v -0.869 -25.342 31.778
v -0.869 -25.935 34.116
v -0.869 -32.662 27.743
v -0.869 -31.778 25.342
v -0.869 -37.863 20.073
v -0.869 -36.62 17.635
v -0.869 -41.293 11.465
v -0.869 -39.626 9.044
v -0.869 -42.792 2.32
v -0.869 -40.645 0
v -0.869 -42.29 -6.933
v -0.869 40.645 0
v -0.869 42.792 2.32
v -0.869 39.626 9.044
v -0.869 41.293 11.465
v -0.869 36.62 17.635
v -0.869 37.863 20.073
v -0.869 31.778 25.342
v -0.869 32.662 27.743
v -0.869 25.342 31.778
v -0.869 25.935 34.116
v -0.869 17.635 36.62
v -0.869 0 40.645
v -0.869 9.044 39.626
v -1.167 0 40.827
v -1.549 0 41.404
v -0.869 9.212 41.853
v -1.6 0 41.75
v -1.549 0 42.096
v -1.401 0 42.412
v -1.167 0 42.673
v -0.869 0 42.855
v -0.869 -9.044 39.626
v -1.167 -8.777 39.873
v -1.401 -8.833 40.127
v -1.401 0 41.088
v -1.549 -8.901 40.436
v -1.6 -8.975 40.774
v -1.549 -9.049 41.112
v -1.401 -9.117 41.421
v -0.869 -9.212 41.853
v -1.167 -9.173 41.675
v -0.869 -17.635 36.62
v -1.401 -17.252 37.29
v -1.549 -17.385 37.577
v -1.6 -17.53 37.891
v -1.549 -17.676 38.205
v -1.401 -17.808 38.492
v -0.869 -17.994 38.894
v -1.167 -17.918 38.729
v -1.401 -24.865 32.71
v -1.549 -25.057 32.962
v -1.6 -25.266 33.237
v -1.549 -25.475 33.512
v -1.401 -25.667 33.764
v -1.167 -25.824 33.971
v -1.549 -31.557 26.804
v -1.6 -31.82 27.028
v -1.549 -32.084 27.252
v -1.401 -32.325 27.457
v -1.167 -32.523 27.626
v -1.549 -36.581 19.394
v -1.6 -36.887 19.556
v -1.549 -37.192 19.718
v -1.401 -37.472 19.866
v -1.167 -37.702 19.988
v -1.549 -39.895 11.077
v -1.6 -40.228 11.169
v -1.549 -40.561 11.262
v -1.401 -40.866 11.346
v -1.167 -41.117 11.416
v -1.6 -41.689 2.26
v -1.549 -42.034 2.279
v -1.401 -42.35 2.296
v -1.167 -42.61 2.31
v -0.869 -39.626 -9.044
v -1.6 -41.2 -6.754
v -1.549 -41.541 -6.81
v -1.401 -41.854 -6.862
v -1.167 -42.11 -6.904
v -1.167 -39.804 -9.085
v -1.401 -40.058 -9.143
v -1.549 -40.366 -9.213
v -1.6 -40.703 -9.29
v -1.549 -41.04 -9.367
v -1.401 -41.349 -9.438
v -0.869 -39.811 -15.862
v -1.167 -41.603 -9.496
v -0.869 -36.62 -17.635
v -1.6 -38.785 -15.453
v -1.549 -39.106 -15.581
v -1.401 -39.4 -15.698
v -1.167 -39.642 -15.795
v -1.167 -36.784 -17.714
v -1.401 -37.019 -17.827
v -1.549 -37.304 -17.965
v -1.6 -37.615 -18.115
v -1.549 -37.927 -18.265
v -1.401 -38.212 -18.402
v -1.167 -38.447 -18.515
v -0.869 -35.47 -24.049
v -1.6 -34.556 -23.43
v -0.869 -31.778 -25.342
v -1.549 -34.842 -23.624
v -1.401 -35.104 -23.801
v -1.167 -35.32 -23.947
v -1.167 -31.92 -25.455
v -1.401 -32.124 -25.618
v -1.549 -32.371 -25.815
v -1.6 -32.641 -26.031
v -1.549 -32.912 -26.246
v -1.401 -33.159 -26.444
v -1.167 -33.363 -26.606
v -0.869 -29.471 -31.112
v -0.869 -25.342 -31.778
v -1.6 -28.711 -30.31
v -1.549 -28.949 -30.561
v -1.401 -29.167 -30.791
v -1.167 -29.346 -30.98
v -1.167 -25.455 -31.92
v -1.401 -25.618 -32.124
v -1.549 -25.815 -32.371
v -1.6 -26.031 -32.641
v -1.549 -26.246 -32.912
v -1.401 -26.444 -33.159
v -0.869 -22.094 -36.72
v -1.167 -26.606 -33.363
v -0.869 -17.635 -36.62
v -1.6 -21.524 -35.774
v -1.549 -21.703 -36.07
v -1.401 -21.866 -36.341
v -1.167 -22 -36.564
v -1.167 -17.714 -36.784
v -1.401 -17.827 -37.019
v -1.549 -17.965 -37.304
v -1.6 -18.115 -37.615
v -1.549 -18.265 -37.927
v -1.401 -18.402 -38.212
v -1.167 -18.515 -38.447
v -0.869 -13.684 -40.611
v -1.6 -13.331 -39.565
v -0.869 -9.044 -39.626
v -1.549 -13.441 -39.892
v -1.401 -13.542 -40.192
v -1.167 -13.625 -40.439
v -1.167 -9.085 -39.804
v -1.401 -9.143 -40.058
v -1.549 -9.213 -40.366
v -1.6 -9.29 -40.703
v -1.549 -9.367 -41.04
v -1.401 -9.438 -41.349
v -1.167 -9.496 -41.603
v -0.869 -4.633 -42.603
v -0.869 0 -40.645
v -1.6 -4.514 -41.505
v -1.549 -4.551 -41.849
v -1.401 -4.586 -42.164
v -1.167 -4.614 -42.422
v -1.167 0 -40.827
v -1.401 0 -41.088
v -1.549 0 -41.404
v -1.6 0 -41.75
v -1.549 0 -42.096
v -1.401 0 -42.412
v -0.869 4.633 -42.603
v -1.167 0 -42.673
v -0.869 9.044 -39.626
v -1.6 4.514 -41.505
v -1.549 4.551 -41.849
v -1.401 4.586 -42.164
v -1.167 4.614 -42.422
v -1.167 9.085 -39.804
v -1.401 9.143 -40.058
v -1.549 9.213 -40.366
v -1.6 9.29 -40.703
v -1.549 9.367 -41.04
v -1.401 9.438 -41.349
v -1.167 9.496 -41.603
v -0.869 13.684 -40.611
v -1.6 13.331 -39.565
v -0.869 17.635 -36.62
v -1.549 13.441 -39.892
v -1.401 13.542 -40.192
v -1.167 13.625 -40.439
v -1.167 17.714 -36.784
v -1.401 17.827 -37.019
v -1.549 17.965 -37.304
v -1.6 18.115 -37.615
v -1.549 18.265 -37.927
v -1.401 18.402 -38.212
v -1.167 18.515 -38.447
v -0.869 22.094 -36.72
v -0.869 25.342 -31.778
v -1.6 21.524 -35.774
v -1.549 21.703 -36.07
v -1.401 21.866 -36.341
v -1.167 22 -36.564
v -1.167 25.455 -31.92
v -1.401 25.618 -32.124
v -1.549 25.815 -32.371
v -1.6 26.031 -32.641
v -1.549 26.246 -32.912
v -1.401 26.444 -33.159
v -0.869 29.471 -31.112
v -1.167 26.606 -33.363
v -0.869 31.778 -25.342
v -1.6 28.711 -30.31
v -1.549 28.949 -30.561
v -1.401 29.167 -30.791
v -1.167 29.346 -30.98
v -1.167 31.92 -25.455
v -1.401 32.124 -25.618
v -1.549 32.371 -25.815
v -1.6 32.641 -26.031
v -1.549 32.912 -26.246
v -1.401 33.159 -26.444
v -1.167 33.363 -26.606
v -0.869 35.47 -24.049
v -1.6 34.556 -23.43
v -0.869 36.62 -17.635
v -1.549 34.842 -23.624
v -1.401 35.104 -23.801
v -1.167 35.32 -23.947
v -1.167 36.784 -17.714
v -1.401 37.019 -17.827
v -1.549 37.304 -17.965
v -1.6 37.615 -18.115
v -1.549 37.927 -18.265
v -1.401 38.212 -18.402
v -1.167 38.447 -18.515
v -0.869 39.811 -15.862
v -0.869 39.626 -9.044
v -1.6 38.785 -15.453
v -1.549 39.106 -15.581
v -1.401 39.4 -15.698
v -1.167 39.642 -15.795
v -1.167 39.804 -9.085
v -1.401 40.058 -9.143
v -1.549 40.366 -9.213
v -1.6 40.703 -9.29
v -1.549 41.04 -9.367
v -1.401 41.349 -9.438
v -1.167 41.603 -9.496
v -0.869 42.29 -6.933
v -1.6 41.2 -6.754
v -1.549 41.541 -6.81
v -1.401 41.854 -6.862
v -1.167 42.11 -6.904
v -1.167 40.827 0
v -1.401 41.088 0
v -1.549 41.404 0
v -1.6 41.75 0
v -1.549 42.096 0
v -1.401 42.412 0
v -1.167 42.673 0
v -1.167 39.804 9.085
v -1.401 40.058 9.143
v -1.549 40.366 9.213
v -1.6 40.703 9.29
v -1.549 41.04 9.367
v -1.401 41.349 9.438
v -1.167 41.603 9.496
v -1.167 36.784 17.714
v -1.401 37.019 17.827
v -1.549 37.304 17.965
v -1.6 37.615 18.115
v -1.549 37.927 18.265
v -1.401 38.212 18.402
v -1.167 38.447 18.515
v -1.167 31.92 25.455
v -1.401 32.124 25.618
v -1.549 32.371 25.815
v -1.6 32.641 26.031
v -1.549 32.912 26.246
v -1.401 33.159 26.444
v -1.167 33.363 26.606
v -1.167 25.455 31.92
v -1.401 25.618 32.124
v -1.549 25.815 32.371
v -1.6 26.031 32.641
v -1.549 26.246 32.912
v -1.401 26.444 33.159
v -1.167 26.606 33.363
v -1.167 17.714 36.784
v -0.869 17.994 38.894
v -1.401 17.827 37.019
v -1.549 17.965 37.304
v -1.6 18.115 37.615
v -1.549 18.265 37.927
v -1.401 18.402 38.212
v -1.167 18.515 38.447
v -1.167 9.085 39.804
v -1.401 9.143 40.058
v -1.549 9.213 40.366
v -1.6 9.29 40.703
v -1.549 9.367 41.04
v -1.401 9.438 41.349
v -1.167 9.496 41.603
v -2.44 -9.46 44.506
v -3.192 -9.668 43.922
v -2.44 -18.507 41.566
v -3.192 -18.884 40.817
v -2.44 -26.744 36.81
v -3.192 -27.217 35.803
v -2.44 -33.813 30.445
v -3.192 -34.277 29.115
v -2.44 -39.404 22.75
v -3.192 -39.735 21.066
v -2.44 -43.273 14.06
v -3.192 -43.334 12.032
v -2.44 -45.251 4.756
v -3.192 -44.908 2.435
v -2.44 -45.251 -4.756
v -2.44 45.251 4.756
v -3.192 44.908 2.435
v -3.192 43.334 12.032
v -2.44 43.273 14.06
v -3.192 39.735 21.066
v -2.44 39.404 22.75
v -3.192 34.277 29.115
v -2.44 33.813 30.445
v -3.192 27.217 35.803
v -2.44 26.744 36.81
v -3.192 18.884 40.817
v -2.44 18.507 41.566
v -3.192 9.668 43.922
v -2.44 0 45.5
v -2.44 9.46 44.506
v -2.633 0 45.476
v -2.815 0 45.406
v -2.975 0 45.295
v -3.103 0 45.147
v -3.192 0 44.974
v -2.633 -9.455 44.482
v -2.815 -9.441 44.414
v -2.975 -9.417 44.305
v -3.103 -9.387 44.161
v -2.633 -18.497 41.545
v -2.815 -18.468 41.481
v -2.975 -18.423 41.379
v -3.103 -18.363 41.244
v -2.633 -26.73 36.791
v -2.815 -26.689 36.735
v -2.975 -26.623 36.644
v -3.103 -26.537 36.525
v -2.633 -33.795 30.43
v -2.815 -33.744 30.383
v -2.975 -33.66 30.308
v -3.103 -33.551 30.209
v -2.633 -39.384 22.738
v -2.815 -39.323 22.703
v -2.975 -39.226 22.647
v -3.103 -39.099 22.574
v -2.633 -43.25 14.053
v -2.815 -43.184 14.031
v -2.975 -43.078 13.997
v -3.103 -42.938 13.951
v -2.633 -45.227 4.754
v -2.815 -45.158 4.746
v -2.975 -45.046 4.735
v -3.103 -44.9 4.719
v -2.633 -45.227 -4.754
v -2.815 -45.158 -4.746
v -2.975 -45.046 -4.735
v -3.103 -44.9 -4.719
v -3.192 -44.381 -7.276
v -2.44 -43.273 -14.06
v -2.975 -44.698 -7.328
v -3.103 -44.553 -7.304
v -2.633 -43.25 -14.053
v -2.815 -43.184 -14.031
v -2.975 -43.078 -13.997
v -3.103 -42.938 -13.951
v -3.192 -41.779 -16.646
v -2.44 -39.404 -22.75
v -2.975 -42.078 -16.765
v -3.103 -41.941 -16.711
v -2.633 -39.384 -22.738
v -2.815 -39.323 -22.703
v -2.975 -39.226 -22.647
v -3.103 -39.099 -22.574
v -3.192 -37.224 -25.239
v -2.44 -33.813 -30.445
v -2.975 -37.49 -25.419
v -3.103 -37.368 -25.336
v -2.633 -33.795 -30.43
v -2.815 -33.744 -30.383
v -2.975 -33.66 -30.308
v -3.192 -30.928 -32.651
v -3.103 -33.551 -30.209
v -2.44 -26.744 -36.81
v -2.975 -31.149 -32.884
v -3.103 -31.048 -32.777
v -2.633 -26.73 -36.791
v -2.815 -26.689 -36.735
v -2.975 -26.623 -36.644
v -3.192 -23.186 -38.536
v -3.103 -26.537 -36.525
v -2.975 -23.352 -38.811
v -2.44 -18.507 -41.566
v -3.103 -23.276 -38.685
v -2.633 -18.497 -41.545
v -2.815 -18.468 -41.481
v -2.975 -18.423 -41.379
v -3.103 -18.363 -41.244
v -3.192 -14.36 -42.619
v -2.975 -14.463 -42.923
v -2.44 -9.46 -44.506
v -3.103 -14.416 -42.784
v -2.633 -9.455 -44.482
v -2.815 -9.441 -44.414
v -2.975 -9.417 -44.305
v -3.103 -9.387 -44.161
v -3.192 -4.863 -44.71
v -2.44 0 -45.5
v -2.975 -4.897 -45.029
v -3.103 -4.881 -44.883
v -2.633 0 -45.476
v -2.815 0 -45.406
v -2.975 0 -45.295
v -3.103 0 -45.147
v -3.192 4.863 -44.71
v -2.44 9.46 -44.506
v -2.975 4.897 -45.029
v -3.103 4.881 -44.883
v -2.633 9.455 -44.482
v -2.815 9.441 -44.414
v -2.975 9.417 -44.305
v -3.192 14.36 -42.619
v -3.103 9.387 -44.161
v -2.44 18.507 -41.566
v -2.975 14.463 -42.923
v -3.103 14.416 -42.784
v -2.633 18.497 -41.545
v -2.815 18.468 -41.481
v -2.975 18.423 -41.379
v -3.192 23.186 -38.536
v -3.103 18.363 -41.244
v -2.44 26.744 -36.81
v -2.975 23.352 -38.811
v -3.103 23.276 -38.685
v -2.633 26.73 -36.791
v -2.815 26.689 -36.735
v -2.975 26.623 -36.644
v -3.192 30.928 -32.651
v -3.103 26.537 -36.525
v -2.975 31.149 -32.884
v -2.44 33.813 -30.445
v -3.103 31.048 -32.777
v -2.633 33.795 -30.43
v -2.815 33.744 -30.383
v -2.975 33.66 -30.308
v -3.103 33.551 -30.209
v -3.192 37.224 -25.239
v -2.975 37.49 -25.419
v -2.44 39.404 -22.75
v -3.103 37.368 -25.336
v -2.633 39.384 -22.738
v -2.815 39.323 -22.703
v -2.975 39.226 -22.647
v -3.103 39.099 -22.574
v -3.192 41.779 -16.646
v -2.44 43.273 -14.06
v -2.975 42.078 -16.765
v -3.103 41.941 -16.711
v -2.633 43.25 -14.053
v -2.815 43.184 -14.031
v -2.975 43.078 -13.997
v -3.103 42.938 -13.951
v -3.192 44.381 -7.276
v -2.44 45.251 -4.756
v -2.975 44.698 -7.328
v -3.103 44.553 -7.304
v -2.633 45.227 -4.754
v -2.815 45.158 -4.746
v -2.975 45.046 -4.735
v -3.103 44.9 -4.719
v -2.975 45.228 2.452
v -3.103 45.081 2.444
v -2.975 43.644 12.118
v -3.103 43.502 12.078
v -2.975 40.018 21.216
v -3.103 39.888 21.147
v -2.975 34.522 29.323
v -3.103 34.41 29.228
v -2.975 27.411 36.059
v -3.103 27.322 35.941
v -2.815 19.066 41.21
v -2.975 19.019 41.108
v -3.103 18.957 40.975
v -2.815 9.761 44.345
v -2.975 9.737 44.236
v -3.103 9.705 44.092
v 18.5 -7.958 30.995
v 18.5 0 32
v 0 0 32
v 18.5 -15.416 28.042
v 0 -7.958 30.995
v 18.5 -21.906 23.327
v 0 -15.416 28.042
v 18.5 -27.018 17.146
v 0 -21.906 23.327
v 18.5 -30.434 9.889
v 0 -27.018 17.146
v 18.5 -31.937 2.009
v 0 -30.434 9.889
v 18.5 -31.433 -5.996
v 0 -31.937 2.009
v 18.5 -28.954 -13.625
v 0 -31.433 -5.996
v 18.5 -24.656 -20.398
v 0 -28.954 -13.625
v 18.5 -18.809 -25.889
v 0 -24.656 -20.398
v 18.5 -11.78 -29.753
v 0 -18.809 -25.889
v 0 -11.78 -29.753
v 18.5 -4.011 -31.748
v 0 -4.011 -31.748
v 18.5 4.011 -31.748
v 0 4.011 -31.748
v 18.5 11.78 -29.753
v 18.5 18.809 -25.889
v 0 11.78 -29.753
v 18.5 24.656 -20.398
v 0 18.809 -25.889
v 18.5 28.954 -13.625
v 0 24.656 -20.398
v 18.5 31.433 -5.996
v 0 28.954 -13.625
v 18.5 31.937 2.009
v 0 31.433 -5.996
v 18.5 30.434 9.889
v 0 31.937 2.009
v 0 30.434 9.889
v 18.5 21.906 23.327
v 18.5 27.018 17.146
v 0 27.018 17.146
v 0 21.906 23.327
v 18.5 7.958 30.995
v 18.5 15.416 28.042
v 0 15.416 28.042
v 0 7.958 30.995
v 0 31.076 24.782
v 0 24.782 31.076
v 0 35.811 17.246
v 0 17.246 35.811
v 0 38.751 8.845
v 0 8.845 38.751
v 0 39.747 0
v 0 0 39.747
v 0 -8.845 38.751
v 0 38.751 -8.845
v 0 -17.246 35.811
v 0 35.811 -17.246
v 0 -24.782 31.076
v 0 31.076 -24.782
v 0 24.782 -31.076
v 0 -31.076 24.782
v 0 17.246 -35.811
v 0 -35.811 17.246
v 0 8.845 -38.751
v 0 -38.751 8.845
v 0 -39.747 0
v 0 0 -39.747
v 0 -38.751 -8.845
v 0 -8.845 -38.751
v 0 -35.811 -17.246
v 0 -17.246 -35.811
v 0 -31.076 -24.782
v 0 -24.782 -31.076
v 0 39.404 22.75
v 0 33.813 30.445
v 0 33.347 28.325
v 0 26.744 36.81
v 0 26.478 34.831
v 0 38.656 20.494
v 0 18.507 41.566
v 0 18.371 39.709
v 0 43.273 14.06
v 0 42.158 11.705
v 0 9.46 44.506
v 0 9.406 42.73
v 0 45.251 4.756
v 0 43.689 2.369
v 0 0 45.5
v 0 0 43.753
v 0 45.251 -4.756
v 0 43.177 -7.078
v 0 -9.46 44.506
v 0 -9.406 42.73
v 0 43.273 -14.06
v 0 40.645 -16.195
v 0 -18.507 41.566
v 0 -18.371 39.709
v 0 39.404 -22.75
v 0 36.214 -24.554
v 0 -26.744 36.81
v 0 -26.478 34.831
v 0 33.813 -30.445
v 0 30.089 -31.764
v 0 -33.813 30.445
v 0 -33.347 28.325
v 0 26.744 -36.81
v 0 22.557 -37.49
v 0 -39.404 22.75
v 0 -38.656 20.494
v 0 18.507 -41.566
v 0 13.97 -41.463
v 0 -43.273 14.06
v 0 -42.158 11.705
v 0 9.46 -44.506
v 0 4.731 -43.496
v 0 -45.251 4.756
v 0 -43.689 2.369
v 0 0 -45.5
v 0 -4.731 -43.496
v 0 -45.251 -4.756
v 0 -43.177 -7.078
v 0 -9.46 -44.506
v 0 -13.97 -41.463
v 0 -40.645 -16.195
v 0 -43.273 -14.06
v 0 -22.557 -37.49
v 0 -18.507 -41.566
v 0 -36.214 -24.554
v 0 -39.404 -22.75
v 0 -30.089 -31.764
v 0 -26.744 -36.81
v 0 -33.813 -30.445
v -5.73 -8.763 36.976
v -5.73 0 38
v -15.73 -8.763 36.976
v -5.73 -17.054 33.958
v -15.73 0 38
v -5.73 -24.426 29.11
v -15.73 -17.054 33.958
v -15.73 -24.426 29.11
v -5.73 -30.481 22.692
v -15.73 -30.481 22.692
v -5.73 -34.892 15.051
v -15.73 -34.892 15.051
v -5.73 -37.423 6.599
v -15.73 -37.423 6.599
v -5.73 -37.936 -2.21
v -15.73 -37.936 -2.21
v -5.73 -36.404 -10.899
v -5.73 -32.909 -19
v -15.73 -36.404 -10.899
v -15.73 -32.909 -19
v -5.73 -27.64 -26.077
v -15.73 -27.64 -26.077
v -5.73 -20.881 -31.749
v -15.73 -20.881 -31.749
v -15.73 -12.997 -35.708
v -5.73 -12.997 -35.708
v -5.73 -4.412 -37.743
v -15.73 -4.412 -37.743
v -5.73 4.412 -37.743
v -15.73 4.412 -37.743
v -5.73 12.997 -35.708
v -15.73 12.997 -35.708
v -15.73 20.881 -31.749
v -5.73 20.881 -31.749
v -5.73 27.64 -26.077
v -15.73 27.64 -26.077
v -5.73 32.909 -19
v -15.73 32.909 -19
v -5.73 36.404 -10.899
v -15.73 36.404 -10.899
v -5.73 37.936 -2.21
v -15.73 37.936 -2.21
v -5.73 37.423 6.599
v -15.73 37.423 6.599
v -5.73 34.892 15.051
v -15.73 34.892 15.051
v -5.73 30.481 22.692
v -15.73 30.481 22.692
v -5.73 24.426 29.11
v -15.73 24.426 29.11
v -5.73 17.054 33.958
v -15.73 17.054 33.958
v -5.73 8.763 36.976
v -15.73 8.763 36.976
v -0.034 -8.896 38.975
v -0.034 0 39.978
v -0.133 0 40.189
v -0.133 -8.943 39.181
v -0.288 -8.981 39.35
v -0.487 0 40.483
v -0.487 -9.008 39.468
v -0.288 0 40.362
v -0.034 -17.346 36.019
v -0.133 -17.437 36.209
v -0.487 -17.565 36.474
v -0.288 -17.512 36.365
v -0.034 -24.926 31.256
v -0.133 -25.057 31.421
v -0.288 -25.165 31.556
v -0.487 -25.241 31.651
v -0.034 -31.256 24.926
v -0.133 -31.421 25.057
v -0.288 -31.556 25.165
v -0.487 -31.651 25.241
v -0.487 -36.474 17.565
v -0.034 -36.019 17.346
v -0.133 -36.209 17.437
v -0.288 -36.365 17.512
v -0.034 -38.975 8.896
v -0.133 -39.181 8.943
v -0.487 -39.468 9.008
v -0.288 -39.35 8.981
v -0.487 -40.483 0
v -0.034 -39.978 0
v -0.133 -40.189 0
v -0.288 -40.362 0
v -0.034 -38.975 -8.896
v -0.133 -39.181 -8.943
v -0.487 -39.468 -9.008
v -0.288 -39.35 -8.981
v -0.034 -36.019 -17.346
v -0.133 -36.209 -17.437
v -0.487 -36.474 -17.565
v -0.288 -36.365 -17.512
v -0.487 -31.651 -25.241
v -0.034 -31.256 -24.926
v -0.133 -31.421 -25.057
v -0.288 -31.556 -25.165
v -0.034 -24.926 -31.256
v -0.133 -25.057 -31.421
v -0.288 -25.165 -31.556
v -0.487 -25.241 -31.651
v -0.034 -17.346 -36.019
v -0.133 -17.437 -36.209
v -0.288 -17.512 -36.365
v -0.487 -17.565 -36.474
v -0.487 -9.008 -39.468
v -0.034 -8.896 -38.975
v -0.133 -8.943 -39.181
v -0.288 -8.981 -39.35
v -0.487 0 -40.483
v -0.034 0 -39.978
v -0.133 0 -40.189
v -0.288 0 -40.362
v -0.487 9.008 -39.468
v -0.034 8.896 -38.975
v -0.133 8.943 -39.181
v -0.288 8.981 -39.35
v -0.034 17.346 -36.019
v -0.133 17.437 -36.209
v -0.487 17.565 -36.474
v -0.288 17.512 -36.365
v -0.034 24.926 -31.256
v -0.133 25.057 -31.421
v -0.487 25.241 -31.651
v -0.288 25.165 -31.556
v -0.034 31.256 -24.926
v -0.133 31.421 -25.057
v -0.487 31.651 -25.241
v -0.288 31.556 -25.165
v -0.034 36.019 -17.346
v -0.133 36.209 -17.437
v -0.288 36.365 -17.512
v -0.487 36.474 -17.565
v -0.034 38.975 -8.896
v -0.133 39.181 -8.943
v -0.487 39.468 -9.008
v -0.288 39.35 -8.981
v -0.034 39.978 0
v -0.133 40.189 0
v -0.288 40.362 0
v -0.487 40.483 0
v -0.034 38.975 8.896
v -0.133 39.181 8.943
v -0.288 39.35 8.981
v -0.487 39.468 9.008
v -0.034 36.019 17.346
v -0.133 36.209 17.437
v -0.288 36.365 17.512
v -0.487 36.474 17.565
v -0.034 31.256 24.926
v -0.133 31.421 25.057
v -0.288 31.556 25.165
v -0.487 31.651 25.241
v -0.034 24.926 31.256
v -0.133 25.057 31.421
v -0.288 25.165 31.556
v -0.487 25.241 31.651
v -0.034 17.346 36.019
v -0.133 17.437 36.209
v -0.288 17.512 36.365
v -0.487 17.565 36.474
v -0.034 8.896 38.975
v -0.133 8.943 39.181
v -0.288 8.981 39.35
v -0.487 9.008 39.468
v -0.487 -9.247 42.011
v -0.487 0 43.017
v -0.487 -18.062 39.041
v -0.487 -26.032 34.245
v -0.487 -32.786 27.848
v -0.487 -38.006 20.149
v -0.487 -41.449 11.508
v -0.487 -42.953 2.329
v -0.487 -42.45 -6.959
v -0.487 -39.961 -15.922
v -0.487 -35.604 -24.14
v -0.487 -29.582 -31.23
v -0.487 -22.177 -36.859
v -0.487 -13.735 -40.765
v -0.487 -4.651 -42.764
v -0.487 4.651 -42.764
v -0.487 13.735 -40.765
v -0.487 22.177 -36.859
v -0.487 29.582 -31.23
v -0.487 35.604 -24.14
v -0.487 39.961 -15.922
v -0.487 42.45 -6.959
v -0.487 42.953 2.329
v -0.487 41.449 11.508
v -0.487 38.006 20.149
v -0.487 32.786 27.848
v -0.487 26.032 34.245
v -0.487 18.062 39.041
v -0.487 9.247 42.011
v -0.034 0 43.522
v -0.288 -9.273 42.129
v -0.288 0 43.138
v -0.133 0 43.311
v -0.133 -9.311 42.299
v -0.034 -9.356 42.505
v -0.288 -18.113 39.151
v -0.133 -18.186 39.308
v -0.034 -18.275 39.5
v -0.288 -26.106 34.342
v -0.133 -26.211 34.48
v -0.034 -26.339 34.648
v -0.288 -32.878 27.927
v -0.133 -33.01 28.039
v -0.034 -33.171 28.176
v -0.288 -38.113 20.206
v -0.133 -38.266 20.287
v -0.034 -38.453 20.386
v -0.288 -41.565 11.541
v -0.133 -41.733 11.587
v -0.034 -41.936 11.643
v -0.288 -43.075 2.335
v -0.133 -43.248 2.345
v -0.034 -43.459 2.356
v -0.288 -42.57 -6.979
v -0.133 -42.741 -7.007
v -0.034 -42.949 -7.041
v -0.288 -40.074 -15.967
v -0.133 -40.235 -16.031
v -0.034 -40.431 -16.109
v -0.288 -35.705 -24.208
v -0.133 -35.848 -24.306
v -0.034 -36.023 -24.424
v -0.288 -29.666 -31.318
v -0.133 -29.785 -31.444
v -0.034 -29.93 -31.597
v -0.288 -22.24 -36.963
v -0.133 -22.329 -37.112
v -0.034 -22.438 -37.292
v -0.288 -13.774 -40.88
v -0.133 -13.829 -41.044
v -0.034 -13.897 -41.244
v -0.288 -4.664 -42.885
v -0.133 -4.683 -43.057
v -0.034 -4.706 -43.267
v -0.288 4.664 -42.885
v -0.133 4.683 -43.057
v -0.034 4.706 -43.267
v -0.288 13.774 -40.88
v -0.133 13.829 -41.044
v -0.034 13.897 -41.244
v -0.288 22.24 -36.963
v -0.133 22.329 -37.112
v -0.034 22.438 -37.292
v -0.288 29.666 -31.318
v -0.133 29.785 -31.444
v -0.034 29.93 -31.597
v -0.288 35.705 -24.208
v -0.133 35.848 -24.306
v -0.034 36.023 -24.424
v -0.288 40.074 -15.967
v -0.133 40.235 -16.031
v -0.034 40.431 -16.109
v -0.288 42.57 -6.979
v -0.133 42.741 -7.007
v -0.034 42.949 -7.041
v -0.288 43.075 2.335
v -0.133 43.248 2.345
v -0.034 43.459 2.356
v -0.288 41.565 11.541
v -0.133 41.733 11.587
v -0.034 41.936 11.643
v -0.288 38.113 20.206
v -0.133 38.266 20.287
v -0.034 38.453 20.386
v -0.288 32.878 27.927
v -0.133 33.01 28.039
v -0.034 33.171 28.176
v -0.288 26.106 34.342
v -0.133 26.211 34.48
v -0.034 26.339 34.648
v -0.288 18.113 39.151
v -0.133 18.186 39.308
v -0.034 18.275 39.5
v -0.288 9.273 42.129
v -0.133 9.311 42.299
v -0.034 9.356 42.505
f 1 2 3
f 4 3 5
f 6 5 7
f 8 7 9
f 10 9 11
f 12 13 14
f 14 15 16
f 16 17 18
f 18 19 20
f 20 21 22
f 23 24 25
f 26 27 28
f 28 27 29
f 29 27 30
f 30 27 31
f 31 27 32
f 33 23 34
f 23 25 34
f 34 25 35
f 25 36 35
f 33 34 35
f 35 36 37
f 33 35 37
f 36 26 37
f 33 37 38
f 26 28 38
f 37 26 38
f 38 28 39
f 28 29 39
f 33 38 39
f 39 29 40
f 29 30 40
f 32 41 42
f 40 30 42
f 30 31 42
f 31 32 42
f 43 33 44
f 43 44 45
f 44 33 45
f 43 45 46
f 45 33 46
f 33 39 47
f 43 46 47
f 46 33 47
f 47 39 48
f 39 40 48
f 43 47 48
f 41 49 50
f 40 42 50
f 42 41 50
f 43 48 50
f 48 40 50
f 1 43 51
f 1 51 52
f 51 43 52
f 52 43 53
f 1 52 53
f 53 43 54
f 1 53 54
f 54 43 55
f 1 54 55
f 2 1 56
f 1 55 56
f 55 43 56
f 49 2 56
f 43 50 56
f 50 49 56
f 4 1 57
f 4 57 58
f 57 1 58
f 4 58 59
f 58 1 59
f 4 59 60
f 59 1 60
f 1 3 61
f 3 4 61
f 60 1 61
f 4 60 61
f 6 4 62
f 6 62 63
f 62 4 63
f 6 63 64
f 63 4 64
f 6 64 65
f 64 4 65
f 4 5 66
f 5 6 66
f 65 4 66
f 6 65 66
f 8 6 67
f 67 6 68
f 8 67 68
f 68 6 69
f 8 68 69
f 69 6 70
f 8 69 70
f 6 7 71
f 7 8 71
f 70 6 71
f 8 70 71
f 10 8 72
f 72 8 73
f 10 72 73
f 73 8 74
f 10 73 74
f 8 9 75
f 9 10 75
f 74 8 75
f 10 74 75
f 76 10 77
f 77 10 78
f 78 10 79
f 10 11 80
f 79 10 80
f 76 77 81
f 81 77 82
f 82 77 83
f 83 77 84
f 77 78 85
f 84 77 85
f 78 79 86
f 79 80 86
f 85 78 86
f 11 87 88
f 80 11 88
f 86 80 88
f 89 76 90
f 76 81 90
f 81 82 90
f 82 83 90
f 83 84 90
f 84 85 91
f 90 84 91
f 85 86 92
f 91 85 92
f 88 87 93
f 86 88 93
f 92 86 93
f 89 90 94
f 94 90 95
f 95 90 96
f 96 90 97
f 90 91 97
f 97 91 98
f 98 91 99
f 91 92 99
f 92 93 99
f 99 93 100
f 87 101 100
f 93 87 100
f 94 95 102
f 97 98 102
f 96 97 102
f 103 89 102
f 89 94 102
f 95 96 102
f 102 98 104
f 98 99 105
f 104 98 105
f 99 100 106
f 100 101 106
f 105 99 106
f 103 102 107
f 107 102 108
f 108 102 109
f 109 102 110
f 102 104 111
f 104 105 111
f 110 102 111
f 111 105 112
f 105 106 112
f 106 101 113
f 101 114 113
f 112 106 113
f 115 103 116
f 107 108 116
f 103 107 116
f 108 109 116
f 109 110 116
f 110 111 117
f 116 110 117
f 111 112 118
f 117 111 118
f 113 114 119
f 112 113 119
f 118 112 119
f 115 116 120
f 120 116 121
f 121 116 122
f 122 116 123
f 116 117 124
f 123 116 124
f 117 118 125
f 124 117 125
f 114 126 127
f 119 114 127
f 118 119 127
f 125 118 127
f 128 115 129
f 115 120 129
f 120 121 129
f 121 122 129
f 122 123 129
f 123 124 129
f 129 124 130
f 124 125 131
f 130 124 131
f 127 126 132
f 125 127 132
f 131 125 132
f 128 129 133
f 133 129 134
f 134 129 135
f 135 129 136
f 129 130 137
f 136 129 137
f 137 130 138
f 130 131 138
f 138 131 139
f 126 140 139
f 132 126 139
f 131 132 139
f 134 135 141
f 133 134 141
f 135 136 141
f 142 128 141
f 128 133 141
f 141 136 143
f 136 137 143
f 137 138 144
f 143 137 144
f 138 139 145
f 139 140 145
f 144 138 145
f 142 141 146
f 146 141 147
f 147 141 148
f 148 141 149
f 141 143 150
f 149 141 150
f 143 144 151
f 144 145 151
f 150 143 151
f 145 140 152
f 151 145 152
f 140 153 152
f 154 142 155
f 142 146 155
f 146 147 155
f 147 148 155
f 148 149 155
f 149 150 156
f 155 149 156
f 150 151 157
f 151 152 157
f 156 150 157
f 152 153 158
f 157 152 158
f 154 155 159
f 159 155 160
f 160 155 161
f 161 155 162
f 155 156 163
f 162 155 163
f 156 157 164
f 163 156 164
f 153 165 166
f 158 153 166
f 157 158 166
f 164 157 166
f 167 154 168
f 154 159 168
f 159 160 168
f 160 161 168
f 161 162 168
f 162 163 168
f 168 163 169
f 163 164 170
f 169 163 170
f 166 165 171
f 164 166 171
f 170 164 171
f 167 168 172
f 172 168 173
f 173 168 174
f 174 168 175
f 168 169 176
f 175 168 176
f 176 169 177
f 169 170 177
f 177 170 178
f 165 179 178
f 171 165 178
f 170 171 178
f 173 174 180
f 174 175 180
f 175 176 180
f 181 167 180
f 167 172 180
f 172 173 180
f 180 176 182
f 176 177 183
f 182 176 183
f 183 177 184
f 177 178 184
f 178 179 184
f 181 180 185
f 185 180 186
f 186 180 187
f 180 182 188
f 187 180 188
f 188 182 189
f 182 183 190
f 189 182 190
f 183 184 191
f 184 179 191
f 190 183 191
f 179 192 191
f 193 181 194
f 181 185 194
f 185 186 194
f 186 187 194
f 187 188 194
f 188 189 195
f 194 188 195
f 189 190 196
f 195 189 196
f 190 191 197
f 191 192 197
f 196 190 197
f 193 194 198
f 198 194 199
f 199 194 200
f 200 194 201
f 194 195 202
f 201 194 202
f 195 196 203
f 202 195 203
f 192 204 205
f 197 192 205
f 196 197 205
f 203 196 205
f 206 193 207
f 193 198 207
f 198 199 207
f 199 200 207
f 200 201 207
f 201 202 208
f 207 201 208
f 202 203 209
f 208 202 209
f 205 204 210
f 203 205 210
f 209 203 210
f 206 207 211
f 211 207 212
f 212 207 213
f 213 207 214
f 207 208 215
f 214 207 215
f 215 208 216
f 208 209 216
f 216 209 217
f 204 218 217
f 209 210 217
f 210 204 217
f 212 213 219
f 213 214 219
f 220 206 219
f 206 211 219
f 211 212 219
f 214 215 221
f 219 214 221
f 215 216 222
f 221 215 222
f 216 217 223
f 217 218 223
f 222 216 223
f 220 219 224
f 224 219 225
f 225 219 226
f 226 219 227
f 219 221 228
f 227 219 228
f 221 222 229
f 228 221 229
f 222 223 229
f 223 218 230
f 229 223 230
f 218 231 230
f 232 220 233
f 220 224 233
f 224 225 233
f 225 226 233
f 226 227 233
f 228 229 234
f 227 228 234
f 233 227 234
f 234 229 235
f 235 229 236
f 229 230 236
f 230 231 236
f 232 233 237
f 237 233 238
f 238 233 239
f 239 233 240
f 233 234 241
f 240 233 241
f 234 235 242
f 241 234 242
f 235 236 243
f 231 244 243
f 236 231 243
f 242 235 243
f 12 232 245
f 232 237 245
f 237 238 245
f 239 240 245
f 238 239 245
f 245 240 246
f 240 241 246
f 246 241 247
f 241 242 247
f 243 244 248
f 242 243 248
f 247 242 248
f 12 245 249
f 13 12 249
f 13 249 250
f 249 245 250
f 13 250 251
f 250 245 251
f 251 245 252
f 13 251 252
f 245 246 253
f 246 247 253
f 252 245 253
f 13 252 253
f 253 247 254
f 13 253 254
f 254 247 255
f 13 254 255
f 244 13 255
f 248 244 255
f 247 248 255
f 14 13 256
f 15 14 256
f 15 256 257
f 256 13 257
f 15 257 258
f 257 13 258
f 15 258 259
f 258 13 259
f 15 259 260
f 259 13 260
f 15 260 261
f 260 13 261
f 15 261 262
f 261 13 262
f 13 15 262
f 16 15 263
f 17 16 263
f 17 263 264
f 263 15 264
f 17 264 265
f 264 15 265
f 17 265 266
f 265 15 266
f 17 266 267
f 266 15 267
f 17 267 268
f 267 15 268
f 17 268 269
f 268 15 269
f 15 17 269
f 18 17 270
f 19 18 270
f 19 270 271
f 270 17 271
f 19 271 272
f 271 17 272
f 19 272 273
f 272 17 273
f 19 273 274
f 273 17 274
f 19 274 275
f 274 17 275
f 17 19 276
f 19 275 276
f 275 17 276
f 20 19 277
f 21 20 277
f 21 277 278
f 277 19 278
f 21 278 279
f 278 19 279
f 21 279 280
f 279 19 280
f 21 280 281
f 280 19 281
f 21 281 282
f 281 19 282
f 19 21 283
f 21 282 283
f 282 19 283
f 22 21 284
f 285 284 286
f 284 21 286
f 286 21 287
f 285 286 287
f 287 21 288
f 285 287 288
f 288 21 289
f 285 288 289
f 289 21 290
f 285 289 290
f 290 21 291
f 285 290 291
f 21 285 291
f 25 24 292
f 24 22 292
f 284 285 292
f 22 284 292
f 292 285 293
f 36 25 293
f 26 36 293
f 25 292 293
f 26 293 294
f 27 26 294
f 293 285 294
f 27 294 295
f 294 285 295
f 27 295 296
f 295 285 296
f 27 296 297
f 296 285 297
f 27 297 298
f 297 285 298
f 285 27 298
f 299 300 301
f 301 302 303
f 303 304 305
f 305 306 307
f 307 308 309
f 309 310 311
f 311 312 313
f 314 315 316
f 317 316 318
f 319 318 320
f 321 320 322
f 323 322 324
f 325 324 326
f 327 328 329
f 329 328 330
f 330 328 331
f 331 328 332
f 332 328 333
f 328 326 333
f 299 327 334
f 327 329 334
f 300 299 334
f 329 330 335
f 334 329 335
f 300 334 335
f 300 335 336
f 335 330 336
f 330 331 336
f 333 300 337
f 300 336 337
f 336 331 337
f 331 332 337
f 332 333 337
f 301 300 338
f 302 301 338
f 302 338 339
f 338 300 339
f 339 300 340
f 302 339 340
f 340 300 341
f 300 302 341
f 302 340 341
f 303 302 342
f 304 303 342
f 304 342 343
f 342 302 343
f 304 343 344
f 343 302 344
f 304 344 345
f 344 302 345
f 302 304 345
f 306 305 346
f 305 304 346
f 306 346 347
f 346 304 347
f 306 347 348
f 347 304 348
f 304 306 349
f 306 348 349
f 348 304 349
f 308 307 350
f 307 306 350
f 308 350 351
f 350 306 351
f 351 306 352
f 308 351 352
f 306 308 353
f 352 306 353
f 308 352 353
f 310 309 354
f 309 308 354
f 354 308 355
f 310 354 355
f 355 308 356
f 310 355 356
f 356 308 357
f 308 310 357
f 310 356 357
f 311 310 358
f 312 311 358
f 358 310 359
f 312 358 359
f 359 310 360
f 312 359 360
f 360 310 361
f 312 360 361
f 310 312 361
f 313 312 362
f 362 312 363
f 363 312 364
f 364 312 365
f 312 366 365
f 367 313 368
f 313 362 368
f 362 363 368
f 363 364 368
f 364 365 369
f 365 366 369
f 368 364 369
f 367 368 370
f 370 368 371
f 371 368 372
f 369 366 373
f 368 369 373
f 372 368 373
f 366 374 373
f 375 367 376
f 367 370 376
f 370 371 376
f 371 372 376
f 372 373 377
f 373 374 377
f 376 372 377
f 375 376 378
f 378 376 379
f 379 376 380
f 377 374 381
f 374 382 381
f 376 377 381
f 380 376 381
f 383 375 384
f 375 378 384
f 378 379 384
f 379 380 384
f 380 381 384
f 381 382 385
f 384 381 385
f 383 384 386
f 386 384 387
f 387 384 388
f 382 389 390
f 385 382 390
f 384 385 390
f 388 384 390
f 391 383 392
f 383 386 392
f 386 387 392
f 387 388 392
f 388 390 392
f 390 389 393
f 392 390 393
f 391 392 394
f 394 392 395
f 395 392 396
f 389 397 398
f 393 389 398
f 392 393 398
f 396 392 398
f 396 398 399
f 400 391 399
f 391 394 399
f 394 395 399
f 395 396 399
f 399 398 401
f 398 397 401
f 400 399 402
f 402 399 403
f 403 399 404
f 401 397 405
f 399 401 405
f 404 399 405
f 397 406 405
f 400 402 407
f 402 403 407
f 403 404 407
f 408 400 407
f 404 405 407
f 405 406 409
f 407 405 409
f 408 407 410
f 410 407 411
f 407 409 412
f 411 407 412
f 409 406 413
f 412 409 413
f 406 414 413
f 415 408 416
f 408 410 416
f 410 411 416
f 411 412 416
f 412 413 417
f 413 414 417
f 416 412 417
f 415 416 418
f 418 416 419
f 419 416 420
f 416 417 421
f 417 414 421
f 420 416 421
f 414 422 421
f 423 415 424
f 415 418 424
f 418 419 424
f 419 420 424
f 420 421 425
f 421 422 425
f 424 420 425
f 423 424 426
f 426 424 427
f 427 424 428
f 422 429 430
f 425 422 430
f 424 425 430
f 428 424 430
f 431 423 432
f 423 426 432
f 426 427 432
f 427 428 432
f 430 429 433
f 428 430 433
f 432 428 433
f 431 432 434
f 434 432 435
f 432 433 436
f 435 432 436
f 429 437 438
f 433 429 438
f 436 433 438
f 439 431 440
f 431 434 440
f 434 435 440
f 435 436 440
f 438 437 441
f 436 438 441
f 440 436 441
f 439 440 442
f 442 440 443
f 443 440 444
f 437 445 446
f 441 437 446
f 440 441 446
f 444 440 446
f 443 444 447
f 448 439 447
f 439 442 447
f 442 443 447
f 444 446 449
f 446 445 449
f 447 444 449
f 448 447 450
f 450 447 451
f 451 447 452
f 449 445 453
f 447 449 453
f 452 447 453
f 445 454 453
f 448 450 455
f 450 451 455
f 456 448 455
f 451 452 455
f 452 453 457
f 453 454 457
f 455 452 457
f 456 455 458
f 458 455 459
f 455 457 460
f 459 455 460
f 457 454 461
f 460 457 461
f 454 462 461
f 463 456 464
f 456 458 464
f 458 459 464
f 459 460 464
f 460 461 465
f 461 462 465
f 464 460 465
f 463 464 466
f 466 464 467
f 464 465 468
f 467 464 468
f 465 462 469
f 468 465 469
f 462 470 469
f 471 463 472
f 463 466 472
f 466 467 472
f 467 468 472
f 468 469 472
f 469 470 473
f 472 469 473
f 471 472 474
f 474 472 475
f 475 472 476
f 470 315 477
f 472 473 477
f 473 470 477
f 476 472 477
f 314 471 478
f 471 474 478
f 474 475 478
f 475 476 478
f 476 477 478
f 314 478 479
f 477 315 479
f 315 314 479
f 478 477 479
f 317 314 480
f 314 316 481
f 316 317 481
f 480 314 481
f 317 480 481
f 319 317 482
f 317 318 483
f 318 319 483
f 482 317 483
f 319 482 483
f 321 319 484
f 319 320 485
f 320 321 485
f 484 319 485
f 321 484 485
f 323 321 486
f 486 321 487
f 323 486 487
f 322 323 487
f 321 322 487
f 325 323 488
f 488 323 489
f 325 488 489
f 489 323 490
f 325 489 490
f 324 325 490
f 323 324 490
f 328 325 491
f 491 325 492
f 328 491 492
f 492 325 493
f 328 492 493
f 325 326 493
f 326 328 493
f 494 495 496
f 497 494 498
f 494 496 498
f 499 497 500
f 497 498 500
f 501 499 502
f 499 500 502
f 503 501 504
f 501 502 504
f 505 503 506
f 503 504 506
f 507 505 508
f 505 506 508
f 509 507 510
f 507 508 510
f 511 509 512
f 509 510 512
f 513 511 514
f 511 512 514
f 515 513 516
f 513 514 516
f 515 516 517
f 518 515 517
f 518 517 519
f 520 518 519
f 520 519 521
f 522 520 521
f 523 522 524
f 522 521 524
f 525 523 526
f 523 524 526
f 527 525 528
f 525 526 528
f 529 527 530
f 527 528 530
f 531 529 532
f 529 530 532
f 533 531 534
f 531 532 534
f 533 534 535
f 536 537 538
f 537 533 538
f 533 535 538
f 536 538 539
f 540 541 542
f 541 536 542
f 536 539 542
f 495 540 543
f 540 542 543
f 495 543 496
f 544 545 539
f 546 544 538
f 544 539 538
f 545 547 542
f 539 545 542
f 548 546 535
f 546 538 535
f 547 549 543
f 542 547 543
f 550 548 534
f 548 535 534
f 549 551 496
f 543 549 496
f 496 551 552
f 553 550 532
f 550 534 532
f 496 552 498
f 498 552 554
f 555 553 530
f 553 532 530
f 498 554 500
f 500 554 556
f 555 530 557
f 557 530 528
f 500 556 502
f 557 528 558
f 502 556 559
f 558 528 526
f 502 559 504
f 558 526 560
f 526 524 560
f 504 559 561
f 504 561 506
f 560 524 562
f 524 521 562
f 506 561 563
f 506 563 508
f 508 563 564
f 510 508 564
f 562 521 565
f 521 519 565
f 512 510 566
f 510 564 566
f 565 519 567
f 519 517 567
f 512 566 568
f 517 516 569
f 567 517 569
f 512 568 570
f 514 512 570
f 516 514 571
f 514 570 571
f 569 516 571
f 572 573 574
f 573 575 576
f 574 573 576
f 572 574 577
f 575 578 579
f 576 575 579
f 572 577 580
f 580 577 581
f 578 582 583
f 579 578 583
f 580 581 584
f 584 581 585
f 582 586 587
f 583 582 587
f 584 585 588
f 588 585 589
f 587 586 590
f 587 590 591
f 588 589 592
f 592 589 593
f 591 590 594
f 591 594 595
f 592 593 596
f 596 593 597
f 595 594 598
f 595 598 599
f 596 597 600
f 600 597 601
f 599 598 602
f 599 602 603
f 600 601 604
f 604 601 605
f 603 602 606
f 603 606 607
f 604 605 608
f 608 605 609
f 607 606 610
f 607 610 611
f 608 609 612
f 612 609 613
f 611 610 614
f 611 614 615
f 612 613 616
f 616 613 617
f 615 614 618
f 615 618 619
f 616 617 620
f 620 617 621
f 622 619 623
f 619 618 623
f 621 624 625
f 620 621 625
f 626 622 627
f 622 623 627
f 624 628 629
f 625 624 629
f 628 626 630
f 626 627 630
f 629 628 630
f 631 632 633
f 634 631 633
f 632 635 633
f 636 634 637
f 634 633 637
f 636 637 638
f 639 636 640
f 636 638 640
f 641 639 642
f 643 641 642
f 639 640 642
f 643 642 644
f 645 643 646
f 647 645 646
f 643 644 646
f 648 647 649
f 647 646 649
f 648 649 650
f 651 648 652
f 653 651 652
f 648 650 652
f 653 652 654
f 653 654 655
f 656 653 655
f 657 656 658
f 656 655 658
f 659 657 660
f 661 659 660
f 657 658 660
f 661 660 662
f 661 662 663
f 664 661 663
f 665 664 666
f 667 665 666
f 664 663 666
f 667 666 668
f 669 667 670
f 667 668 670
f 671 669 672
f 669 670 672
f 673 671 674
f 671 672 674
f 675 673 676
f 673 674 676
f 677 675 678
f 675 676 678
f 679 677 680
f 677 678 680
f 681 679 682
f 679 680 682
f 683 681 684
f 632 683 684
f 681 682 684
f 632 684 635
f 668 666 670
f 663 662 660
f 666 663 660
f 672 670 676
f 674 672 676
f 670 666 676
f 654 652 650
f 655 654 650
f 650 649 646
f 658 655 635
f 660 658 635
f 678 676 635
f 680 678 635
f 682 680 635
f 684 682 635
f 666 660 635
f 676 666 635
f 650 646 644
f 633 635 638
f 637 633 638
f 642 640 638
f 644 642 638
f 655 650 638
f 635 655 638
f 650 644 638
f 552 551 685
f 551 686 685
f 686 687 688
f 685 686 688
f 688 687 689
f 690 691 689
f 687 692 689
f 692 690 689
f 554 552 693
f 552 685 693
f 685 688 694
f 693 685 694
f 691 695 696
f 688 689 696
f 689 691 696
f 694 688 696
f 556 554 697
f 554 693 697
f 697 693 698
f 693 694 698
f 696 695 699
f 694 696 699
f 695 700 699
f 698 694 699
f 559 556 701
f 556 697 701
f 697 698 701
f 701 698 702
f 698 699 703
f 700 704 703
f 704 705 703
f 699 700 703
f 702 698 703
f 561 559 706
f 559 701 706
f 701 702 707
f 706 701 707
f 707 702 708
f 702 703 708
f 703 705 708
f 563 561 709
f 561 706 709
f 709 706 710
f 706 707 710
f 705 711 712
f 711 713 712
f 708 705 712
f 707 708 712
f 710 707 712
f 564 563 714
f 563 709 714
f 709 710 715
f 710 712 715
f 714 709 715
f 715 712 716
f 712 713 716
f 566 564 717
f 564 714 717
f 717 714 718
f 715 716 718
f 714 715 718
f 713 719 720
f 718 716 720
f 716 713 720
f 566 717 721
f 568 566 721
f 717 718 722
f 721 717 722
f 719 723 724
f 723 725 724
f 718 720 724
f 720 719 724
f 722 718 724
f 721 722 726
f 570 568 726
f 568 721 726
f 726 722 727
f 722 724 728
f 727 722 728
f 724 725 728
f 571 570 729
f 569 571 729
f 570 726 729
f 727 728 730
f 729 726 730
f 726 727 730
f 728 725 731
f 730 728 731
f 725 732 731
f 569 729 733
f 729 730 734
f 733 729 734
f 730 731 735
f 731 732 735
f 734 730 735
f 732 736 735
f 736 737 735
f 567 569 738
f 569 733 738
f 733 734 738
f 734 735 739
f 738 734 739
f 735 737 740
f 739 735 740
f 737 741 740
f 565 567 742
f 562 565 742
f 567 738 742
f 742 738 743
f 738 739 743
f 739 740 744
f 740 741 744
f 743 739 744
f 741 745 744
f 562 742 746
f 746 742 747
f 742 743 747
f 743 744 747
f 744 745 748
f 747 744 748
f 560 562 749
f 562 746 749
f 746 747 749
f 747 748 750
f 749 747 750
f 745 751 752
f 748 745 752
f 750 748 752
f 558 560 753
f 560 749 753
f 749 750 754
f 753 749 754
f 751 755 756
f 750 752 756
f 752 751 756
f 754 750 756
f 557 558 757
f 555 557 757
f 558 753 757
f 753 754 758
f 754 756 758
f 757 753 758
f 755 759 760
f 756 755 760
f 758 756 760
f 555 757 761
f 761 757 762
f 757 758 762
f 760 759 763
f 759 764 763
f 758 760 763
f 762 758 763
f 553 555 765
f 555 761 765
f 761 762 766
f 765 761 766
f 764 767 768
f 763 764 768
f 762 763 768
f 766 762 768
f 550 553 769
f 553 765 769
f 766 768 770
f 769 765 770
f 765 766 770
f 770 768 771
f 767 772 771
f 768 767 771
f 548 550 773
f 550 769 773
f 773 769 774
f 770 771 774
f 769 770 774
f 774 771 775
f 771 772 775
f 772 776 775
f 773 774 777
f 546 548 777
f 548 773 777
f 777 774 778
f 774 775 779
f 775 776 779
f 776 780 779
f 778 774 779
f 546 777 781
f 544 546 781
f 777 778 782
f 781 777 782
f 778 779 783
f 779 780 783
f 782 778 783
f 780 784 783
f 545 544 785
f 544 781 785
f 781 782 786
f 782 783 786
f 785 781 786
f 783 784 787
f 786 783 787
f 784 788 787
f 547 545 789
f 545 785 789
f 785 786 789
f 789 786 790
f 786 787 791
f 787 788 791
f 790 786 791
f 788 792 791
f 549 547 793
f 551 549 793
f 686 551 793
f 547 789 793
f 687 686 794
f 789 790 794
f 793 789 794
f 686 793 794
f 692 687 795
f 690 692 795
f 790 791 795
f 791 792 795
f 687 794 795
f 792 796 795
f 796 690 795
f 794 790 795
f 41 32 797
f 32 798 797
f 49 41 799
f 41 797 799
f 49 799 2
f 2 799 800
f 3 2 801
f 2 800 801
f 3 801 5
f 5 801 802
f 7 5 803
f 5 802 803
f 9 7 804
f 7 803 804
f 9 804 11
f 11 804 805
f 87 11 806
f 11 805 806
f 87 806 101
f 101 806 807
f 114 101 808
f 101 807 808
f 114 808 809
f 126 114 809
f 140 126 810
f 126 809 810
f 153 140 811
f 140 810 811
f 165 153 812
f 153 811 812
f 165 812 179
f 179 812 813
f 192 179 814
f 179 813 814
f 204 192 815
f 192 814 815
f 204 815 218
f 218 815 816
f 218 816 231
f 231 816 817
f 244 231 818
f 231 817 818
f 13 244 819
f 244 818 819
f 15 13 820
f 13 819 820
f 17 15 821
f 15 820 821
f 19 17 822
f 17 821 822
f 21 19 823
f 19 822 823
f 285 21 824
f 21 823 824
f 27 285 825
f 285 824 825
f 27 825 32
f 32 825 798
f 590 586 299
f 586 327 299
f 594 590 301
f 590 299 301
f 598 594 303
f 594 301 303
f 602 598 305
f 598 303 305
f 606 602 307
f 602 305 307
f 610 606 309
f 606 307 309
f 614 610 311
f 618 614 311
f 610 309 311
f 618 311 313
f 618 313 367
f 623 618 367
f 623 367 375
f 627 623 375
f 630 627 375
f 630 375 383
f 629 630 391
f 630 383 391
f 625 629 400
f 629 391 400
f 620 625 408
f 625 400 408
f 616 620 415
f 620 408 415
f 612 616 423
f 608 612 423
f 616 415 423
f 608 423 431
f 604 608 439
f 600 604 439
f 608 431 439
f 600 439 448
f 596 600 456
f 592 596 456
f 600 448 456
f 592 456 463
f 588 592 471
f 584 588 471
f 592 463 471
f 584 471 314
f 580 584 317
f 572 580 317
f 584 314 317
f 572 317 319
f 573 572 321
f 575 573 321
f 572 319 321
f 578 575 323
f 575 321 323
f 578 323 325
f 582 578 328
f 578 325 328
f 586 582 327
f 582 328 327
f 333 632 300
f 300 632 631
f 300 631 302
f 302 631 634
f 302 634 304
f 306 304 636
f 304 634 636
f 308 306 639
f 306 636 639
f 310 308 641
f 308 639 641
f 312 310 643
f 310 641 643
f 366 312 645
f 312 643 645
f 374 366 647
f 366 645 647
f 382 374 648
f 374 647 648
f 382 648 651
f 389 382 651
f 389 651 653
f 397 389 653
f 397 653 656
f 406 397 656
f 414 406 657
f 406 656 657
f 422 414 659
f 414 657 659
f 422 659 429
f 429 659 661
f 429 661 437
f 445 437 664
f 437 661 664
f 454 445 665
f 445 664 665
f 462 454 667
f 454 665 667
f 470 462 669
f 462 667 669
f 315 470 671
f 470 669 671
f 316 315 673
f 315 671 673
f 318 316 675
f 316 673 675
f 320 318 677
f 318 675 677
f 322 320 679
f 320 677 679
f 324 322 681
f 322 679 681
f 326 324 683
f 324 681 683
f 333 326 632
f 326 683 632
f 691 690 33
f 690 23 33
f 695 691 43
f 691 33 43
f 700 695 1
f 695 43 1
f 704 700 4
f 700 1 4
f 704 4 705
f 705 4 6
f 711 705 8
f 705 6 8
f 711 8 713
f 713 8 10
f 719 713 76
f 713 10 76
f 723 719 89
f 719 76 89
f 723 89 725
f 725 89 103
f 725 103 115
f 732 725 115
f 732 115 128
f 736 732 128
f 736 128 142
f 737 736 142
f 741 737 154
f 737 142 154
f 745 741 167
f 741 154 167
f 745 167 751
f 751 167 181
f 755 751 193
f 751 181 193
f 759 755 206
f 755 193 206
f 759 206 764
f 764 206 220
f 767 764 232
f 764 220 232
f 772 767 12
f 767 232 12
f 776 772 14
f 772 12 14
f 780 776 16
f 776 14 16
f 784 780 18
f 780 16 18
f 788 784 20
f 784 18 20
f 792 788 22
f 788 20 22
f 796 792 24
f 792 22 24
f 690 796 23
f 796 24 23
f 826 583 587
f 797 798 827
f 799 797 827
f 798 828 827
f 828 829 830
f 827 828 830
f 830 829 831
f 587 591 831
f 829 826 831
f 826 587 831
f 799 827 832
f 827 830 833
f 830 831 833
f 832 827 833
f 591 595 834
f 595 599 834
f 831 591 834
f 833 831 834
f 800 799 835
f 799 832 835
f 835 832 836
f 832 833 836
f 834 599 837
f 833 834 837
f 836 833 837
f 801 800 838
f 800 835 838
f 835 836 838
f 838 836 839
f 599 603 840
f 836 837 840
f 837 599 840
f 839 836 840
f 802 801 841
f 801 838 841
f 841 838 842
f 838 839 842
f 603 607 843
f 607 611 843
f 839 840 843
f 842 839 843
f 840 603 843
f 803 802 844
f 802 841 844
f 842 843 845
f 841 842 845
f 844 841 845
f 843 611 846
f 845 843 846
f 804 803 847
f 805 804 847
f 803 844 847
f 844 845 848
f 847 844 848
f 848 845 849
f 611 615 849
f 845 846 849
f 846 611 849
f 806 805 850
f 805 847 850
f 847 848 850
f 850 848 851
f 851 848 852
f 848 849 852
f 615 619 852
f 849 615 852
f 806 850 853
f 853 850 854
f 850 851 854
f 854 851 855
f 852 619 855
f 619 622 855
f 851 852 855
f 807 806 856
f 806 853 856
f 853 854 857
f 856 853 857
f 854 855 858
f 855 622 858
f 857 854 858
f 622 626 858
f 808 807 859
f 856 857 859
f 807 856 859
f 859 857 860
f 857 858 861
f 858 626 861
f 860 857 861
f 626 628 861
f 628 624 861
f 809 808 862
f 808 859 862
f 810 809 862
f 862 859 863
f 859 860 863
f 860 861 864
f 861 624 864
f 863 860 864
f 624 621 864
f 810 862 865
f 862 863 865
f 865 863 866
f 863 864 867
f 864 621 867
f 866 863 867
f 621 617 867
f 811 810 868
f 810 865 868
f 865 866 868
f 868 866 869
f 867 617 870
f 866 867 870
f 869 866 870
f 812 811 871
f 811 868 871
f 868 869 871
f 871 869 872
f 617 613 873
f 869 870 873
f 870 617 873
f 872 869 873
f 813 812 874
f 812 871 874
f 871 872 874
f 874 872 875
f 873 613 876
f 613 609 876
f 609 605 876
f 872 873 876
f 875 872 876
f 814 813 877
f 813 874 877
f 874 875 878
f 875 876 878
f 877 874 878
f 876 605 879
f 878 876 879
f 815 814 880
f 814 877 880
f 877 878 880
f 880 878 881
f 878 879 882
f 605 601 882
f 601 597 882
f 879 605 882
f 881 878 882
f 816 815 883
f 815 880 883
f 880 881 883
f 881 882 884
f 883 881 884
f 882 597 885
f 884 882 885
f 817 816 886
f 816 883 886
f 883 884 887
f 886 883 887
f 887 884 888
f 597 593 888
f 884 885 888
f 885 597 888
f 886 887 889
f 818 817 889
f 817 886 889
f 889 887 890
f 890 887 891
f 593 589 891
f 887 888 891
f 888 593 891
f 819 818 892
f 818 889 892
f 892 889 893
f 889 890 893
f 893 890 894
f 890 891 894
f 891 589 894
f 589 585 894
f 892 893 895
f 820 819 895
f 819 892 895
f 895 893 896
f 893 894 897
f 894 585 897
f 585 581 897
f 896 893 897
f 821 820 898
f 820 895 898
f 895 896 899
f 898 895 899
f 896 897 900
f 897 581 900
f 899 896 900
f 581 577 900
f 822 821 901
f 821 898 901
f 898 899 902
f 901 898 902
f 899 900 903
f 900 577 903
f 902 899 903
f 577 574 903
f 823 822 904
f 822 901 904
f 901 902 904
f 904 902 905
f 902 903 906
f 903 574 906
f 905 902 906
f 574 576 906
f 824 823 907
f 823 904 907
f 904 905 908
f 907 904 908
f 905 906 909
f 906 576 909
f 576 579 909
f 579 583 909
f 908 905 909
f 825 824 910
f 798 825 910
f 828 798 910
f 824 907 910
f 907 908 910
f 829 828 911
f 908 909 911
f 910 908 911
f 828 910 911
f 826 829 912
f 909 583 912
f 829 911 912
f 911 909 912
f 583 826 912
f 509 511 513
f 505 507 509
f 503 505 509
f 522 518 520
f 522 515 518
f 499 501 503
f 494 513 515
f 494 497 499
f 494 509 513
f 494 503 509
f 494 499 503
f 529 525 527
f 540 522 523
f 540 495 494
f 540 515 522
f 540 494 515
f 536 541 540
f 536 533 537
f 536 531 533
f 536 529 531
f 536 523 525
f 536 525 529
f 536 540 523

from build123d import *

# Parameters (mm, degrees)
F3_R     = 32
F4_DEPTH = 5


with BuildPart() as f2:
    # F1 (on Front) → F2 (revolve)
    with BuildSketch(Plane.XZ):
        with BuildLine():
            Line((0, 43.752931), (0, 45.5))
            Line((0, 45.5), (-2.439834, 45.5))
            ThreePointArc((-2.439834, 45.5), (-2.898695, 45.355322), (-3.191588, 44.973616))
            Line((-3.191588, 44.973616), (-5.729777, 38))
            Line((-5.729777, 38), (-15.729777, 38))
            Line((-15.729777, 38), (-15.729777, 0))
            Line((-15.729777, 0), (23.5, 0))
            Line((23.5, 0), (23.5, 32))
            Line((23.5, 32), (0, 32))
            Line((0, 32), (0, 39.747069))
            ThreePointArc((0, 39.747069), (-0.132891, 40.188619), (-0.487415, 40.483473))
            Line((-0.487415, 40.483473), (-0.868877, 40.645394))
            ThreePointArc((-0.868877, 40.645394), (-1.6, 41.75), (-0.868877, 42.854606))
            Line((-0.868877, 42.854606), (-0.487415, 43.016527))
            ThreePointArc((-0.487415, 43.016527), (-0.132891, 43.311381), (0, 43.752931))
        make_face()
    revolve(axis=Axis((-0.354707, 0, 0), (1, 0, 0)))

    # F3 (on face) → F4 (cut)
    with BuildSketch(Plane.YZ.offset(23.5)):
        Circle(F3_R)
    extrude(amount=-F4_DEPTH, mode=Mode.SUBTRACT)


solid = f2.part
